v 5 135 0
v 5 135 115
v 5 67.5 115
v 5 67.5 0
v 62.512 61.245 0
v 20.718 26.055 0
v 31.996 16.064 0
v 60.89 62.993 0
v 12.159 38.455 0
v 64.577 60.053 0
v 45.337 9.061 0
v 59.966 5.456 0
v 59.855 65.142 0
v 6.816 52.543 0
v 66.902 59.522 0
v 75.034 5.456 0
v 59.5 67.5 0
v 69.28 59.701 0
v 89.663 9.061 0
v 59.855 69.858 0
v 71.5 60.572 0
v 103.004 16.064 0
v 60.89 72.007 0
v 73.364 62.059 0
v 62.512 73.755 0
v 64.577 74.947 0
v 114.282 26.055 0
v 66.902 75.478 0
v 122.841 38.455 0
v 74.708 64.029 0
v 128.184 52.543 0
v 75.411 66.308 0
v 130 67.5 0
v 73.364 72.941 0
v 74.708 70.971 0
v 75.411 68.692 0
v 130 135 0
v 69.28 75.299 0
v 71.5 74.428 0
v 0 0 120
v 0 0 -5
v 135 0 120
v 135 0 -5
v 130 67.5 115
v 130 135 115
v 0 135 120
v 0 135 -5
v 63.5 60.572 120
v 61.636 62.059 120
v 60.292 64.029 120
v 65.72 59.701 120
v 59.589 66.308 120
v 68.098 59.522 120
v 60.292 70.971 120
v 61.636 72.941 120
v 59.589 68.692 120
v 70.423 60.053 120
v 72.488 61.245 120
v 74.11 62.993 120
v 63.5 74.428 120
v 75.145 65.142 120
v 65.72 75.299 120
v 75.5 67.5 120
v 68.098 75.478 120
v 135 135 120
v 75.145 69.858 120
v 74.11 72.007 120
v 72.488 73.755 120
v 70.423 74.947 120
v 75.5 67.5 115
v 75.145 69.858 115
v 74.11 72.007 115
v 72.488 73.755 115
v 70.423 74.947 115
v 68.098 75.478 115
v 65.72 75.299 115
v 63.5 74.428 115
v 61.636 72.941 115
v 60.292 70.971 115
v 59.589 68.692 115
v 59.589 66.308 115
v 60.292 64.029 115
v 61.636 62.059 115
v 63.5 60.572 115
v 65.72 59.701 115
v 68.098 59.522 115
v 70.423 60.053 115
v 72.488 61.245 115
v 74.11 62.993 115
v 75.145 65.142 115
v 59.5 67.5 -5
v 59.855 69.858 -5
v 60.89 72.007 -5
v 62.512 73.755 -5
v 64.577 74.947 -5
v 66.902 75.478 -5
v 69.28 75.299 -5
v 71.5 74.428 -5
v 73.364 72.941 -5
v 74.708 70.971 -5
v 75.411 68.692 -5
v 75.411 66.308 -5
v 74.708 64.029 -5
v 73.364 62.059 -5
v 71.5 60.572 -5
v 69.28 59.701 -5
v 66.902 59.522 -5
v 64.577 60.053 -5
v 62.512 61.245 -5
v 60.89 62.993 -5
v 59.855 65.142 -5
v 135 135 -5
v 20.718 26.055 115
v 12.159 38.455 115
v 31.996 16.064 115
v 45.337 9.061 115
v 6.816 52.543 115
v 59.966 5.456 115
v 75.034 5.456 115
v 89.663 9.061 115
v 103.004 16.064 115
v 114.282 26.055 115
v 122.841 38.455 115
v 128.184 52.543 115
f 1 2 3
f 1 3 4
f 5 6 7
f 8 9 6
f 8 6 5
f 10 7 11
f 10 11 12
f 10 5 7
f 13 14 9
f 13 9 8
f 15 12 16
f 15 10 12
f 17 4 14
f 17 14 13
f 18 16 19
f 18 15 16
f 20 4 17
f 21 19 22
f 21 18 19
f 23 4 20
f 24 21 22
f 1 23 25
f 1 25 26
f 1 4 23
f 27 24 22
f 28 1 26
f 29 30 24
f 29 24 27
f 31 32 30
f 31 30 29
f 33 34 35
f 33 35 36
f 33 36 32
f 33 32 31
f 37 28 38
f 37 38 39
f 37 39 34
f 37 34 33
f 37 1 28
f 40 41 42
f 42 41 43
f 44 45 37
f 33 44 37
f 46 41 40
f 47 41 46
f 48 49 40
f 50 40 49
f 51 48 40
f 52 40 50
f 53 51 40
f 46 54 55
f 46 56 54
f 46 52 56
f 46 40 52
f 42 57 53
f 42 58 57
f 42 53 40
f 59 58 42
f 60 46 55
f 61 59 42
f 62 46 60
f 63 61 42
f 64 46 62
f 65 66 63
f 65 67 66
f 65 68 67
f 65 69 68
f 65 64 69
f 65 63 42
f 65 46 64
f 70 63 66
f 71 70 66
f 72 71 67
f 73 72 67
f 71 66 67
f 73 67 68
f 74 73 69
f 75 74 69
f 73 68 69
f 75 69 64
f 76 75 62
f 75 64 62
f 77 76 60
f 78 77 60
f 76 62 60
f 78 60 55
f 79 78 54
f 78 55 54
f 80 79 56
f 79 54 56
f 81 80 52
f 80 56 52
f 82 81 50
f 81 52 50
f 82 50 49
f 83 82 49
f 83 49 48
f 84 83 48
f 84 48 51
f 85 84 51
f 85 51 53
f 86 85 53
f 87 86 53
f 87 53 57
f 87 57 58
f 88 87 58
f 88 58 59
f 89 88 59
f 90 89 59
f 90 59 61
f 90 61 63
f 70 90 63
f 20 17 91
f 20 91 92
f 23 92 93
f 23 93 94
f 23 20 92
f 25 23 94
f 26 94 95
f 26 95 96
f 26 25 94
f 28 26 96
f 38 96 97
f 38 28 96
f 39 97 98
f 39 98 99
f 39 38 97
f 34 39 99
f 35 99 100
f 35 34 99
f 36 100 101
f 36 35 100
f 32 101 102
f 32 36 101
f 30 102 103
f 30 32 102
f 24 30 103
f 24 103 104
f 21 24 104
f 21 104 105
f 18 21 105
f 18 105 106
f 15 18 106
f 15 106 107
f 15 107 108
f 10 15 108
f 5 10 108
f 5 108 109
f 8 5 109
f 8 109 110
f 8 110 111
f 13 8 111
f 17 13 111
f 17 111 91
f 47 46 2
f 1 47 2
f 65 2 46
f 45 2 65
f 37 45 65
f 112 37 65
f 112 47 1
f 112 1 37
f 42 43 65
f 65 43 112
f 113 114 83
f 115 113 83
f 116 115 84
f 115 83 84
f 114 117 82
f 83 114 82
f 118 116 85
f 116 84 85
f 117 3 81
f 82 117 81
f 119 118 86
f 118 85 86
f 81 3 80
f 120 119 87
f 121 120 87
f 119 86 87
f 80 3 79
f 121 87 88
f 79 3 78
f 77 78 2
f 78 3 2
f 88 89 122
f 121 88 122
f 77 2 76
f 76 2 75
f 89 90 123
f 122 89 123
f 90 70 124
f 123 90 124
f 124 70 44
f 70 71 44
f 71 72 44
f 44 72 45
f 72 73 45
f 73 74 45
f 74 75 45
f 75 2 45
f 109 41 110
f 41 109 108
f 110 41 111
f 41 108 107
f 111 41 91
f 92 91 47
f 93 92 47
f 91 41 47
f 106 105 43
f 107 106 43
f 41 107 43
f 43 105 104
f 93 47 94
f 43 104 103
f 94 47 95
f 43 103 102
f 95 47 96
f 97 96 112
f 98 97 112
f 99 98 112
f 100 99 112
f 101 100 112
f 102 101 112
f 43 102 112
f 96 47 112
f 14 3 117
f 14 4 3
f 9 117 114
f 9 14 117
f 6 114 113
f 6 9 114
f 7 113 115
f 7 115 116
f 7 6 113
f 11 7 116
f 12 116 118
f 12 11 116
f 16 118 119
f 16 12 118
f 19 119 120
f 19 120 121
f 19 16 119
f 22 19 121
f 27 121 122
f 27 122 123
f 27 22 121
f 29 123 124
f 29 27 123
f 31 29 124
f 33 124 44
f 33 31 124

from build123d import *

# Parameters (mm, degrees)
SKETCH2_W           = 135
SKETCH2_H           = 135
SKETCH2_R           = 8
BOSS_EXTRUDE3_DEPTH = 5
SKETCH2_3_W         = 135
SKETCH2_3_H         = 135
BOSS_EXTRUDE4_DEPTH = 120
SKETCH3_W           = 125
SKETCH3_H           = 115
CUT_EXTRUDE1_DEPTH  = 67.5
CUT_EXTRUDE2_START  = 115
CUT_EXTRUDE2_DEPTH  = 115
CUT_EXTRUDE3_START  = 120
SKETCH2_6_R         = 8
CUT_EXTRUDE3_DEPTH  = 120


with BuildPart() as part:
    # Sketch2 → Boss-Extrude3 (new body)
    with BuildSketch(Plane.XY):
        with Locations((67.5, 67.5)):
            Rectangle(SKETCH2_W, SKETCH2_H)
        with Locations((67.5, 67.5)):
            Circle(SKETCH2_R, mode=Mode.SUBTRACT)
    extrude(amount=-BOSS_EXTRUDE3_DEPTH)

    # Sketch2<3> → Boss-Extrude4 (add)
    with BuildSketch(Plane.XY):
        with Locations((67.5, 67.5)):
            Rectangle(SKETCH2_3_W, SKETCH2_3_H)
    extrude(amount=BOSS_EXTRUDE4_DEPTH)

    # Sketch3 → Cut-Extrude1 (cut)
    with BuildSketch(Plane(origin=(0, 135, 0), x_dir=(1, 0, 0), z_dir=(0, 1, 0))):
        with Locations((67.5, -57.5)):
            Rectangle(SKETCH3_W, SKETCH3_H)
    extrude(amount=-CUT_EXTRUDE1_DEPTH, mode=Mode.SUBTRACT)

    # Sketch2<5> → Cut-Extrude2 (cut)
    with BuildSketch(Plane.XY.offset(CUT_EXTRUDE2_START)):
        with BuildLine():
            Line((130, 67.5), (75.5, 67.5))
            ThreePointArc((75.5, 67.5), (67.5, 75.5), (59.5, 67.5))
            Line((59.5, 67.5), (5, 67.5))
            ThreePointArc((5, 67.5), (67.5, 5), (130, 67.5))
        make_face()
    extrude(amount=-CUT_EXTRUDE2_DEPTH, mode=Mode.SUBTRACT)

    # Sketch2<6> → Cut-Extrude3 (cut)
    with BuildSketch(Plane.XY.offset(CUT_EXTRUDE3_START)):
        with Locations((67.5, 67.5)):
            Circle(SKETCH2_6_R)
    extrude(amount=-CUT_EXTRUDE3_DEPTH, mode=Mode.SUBTRACT)


solid = part.part
